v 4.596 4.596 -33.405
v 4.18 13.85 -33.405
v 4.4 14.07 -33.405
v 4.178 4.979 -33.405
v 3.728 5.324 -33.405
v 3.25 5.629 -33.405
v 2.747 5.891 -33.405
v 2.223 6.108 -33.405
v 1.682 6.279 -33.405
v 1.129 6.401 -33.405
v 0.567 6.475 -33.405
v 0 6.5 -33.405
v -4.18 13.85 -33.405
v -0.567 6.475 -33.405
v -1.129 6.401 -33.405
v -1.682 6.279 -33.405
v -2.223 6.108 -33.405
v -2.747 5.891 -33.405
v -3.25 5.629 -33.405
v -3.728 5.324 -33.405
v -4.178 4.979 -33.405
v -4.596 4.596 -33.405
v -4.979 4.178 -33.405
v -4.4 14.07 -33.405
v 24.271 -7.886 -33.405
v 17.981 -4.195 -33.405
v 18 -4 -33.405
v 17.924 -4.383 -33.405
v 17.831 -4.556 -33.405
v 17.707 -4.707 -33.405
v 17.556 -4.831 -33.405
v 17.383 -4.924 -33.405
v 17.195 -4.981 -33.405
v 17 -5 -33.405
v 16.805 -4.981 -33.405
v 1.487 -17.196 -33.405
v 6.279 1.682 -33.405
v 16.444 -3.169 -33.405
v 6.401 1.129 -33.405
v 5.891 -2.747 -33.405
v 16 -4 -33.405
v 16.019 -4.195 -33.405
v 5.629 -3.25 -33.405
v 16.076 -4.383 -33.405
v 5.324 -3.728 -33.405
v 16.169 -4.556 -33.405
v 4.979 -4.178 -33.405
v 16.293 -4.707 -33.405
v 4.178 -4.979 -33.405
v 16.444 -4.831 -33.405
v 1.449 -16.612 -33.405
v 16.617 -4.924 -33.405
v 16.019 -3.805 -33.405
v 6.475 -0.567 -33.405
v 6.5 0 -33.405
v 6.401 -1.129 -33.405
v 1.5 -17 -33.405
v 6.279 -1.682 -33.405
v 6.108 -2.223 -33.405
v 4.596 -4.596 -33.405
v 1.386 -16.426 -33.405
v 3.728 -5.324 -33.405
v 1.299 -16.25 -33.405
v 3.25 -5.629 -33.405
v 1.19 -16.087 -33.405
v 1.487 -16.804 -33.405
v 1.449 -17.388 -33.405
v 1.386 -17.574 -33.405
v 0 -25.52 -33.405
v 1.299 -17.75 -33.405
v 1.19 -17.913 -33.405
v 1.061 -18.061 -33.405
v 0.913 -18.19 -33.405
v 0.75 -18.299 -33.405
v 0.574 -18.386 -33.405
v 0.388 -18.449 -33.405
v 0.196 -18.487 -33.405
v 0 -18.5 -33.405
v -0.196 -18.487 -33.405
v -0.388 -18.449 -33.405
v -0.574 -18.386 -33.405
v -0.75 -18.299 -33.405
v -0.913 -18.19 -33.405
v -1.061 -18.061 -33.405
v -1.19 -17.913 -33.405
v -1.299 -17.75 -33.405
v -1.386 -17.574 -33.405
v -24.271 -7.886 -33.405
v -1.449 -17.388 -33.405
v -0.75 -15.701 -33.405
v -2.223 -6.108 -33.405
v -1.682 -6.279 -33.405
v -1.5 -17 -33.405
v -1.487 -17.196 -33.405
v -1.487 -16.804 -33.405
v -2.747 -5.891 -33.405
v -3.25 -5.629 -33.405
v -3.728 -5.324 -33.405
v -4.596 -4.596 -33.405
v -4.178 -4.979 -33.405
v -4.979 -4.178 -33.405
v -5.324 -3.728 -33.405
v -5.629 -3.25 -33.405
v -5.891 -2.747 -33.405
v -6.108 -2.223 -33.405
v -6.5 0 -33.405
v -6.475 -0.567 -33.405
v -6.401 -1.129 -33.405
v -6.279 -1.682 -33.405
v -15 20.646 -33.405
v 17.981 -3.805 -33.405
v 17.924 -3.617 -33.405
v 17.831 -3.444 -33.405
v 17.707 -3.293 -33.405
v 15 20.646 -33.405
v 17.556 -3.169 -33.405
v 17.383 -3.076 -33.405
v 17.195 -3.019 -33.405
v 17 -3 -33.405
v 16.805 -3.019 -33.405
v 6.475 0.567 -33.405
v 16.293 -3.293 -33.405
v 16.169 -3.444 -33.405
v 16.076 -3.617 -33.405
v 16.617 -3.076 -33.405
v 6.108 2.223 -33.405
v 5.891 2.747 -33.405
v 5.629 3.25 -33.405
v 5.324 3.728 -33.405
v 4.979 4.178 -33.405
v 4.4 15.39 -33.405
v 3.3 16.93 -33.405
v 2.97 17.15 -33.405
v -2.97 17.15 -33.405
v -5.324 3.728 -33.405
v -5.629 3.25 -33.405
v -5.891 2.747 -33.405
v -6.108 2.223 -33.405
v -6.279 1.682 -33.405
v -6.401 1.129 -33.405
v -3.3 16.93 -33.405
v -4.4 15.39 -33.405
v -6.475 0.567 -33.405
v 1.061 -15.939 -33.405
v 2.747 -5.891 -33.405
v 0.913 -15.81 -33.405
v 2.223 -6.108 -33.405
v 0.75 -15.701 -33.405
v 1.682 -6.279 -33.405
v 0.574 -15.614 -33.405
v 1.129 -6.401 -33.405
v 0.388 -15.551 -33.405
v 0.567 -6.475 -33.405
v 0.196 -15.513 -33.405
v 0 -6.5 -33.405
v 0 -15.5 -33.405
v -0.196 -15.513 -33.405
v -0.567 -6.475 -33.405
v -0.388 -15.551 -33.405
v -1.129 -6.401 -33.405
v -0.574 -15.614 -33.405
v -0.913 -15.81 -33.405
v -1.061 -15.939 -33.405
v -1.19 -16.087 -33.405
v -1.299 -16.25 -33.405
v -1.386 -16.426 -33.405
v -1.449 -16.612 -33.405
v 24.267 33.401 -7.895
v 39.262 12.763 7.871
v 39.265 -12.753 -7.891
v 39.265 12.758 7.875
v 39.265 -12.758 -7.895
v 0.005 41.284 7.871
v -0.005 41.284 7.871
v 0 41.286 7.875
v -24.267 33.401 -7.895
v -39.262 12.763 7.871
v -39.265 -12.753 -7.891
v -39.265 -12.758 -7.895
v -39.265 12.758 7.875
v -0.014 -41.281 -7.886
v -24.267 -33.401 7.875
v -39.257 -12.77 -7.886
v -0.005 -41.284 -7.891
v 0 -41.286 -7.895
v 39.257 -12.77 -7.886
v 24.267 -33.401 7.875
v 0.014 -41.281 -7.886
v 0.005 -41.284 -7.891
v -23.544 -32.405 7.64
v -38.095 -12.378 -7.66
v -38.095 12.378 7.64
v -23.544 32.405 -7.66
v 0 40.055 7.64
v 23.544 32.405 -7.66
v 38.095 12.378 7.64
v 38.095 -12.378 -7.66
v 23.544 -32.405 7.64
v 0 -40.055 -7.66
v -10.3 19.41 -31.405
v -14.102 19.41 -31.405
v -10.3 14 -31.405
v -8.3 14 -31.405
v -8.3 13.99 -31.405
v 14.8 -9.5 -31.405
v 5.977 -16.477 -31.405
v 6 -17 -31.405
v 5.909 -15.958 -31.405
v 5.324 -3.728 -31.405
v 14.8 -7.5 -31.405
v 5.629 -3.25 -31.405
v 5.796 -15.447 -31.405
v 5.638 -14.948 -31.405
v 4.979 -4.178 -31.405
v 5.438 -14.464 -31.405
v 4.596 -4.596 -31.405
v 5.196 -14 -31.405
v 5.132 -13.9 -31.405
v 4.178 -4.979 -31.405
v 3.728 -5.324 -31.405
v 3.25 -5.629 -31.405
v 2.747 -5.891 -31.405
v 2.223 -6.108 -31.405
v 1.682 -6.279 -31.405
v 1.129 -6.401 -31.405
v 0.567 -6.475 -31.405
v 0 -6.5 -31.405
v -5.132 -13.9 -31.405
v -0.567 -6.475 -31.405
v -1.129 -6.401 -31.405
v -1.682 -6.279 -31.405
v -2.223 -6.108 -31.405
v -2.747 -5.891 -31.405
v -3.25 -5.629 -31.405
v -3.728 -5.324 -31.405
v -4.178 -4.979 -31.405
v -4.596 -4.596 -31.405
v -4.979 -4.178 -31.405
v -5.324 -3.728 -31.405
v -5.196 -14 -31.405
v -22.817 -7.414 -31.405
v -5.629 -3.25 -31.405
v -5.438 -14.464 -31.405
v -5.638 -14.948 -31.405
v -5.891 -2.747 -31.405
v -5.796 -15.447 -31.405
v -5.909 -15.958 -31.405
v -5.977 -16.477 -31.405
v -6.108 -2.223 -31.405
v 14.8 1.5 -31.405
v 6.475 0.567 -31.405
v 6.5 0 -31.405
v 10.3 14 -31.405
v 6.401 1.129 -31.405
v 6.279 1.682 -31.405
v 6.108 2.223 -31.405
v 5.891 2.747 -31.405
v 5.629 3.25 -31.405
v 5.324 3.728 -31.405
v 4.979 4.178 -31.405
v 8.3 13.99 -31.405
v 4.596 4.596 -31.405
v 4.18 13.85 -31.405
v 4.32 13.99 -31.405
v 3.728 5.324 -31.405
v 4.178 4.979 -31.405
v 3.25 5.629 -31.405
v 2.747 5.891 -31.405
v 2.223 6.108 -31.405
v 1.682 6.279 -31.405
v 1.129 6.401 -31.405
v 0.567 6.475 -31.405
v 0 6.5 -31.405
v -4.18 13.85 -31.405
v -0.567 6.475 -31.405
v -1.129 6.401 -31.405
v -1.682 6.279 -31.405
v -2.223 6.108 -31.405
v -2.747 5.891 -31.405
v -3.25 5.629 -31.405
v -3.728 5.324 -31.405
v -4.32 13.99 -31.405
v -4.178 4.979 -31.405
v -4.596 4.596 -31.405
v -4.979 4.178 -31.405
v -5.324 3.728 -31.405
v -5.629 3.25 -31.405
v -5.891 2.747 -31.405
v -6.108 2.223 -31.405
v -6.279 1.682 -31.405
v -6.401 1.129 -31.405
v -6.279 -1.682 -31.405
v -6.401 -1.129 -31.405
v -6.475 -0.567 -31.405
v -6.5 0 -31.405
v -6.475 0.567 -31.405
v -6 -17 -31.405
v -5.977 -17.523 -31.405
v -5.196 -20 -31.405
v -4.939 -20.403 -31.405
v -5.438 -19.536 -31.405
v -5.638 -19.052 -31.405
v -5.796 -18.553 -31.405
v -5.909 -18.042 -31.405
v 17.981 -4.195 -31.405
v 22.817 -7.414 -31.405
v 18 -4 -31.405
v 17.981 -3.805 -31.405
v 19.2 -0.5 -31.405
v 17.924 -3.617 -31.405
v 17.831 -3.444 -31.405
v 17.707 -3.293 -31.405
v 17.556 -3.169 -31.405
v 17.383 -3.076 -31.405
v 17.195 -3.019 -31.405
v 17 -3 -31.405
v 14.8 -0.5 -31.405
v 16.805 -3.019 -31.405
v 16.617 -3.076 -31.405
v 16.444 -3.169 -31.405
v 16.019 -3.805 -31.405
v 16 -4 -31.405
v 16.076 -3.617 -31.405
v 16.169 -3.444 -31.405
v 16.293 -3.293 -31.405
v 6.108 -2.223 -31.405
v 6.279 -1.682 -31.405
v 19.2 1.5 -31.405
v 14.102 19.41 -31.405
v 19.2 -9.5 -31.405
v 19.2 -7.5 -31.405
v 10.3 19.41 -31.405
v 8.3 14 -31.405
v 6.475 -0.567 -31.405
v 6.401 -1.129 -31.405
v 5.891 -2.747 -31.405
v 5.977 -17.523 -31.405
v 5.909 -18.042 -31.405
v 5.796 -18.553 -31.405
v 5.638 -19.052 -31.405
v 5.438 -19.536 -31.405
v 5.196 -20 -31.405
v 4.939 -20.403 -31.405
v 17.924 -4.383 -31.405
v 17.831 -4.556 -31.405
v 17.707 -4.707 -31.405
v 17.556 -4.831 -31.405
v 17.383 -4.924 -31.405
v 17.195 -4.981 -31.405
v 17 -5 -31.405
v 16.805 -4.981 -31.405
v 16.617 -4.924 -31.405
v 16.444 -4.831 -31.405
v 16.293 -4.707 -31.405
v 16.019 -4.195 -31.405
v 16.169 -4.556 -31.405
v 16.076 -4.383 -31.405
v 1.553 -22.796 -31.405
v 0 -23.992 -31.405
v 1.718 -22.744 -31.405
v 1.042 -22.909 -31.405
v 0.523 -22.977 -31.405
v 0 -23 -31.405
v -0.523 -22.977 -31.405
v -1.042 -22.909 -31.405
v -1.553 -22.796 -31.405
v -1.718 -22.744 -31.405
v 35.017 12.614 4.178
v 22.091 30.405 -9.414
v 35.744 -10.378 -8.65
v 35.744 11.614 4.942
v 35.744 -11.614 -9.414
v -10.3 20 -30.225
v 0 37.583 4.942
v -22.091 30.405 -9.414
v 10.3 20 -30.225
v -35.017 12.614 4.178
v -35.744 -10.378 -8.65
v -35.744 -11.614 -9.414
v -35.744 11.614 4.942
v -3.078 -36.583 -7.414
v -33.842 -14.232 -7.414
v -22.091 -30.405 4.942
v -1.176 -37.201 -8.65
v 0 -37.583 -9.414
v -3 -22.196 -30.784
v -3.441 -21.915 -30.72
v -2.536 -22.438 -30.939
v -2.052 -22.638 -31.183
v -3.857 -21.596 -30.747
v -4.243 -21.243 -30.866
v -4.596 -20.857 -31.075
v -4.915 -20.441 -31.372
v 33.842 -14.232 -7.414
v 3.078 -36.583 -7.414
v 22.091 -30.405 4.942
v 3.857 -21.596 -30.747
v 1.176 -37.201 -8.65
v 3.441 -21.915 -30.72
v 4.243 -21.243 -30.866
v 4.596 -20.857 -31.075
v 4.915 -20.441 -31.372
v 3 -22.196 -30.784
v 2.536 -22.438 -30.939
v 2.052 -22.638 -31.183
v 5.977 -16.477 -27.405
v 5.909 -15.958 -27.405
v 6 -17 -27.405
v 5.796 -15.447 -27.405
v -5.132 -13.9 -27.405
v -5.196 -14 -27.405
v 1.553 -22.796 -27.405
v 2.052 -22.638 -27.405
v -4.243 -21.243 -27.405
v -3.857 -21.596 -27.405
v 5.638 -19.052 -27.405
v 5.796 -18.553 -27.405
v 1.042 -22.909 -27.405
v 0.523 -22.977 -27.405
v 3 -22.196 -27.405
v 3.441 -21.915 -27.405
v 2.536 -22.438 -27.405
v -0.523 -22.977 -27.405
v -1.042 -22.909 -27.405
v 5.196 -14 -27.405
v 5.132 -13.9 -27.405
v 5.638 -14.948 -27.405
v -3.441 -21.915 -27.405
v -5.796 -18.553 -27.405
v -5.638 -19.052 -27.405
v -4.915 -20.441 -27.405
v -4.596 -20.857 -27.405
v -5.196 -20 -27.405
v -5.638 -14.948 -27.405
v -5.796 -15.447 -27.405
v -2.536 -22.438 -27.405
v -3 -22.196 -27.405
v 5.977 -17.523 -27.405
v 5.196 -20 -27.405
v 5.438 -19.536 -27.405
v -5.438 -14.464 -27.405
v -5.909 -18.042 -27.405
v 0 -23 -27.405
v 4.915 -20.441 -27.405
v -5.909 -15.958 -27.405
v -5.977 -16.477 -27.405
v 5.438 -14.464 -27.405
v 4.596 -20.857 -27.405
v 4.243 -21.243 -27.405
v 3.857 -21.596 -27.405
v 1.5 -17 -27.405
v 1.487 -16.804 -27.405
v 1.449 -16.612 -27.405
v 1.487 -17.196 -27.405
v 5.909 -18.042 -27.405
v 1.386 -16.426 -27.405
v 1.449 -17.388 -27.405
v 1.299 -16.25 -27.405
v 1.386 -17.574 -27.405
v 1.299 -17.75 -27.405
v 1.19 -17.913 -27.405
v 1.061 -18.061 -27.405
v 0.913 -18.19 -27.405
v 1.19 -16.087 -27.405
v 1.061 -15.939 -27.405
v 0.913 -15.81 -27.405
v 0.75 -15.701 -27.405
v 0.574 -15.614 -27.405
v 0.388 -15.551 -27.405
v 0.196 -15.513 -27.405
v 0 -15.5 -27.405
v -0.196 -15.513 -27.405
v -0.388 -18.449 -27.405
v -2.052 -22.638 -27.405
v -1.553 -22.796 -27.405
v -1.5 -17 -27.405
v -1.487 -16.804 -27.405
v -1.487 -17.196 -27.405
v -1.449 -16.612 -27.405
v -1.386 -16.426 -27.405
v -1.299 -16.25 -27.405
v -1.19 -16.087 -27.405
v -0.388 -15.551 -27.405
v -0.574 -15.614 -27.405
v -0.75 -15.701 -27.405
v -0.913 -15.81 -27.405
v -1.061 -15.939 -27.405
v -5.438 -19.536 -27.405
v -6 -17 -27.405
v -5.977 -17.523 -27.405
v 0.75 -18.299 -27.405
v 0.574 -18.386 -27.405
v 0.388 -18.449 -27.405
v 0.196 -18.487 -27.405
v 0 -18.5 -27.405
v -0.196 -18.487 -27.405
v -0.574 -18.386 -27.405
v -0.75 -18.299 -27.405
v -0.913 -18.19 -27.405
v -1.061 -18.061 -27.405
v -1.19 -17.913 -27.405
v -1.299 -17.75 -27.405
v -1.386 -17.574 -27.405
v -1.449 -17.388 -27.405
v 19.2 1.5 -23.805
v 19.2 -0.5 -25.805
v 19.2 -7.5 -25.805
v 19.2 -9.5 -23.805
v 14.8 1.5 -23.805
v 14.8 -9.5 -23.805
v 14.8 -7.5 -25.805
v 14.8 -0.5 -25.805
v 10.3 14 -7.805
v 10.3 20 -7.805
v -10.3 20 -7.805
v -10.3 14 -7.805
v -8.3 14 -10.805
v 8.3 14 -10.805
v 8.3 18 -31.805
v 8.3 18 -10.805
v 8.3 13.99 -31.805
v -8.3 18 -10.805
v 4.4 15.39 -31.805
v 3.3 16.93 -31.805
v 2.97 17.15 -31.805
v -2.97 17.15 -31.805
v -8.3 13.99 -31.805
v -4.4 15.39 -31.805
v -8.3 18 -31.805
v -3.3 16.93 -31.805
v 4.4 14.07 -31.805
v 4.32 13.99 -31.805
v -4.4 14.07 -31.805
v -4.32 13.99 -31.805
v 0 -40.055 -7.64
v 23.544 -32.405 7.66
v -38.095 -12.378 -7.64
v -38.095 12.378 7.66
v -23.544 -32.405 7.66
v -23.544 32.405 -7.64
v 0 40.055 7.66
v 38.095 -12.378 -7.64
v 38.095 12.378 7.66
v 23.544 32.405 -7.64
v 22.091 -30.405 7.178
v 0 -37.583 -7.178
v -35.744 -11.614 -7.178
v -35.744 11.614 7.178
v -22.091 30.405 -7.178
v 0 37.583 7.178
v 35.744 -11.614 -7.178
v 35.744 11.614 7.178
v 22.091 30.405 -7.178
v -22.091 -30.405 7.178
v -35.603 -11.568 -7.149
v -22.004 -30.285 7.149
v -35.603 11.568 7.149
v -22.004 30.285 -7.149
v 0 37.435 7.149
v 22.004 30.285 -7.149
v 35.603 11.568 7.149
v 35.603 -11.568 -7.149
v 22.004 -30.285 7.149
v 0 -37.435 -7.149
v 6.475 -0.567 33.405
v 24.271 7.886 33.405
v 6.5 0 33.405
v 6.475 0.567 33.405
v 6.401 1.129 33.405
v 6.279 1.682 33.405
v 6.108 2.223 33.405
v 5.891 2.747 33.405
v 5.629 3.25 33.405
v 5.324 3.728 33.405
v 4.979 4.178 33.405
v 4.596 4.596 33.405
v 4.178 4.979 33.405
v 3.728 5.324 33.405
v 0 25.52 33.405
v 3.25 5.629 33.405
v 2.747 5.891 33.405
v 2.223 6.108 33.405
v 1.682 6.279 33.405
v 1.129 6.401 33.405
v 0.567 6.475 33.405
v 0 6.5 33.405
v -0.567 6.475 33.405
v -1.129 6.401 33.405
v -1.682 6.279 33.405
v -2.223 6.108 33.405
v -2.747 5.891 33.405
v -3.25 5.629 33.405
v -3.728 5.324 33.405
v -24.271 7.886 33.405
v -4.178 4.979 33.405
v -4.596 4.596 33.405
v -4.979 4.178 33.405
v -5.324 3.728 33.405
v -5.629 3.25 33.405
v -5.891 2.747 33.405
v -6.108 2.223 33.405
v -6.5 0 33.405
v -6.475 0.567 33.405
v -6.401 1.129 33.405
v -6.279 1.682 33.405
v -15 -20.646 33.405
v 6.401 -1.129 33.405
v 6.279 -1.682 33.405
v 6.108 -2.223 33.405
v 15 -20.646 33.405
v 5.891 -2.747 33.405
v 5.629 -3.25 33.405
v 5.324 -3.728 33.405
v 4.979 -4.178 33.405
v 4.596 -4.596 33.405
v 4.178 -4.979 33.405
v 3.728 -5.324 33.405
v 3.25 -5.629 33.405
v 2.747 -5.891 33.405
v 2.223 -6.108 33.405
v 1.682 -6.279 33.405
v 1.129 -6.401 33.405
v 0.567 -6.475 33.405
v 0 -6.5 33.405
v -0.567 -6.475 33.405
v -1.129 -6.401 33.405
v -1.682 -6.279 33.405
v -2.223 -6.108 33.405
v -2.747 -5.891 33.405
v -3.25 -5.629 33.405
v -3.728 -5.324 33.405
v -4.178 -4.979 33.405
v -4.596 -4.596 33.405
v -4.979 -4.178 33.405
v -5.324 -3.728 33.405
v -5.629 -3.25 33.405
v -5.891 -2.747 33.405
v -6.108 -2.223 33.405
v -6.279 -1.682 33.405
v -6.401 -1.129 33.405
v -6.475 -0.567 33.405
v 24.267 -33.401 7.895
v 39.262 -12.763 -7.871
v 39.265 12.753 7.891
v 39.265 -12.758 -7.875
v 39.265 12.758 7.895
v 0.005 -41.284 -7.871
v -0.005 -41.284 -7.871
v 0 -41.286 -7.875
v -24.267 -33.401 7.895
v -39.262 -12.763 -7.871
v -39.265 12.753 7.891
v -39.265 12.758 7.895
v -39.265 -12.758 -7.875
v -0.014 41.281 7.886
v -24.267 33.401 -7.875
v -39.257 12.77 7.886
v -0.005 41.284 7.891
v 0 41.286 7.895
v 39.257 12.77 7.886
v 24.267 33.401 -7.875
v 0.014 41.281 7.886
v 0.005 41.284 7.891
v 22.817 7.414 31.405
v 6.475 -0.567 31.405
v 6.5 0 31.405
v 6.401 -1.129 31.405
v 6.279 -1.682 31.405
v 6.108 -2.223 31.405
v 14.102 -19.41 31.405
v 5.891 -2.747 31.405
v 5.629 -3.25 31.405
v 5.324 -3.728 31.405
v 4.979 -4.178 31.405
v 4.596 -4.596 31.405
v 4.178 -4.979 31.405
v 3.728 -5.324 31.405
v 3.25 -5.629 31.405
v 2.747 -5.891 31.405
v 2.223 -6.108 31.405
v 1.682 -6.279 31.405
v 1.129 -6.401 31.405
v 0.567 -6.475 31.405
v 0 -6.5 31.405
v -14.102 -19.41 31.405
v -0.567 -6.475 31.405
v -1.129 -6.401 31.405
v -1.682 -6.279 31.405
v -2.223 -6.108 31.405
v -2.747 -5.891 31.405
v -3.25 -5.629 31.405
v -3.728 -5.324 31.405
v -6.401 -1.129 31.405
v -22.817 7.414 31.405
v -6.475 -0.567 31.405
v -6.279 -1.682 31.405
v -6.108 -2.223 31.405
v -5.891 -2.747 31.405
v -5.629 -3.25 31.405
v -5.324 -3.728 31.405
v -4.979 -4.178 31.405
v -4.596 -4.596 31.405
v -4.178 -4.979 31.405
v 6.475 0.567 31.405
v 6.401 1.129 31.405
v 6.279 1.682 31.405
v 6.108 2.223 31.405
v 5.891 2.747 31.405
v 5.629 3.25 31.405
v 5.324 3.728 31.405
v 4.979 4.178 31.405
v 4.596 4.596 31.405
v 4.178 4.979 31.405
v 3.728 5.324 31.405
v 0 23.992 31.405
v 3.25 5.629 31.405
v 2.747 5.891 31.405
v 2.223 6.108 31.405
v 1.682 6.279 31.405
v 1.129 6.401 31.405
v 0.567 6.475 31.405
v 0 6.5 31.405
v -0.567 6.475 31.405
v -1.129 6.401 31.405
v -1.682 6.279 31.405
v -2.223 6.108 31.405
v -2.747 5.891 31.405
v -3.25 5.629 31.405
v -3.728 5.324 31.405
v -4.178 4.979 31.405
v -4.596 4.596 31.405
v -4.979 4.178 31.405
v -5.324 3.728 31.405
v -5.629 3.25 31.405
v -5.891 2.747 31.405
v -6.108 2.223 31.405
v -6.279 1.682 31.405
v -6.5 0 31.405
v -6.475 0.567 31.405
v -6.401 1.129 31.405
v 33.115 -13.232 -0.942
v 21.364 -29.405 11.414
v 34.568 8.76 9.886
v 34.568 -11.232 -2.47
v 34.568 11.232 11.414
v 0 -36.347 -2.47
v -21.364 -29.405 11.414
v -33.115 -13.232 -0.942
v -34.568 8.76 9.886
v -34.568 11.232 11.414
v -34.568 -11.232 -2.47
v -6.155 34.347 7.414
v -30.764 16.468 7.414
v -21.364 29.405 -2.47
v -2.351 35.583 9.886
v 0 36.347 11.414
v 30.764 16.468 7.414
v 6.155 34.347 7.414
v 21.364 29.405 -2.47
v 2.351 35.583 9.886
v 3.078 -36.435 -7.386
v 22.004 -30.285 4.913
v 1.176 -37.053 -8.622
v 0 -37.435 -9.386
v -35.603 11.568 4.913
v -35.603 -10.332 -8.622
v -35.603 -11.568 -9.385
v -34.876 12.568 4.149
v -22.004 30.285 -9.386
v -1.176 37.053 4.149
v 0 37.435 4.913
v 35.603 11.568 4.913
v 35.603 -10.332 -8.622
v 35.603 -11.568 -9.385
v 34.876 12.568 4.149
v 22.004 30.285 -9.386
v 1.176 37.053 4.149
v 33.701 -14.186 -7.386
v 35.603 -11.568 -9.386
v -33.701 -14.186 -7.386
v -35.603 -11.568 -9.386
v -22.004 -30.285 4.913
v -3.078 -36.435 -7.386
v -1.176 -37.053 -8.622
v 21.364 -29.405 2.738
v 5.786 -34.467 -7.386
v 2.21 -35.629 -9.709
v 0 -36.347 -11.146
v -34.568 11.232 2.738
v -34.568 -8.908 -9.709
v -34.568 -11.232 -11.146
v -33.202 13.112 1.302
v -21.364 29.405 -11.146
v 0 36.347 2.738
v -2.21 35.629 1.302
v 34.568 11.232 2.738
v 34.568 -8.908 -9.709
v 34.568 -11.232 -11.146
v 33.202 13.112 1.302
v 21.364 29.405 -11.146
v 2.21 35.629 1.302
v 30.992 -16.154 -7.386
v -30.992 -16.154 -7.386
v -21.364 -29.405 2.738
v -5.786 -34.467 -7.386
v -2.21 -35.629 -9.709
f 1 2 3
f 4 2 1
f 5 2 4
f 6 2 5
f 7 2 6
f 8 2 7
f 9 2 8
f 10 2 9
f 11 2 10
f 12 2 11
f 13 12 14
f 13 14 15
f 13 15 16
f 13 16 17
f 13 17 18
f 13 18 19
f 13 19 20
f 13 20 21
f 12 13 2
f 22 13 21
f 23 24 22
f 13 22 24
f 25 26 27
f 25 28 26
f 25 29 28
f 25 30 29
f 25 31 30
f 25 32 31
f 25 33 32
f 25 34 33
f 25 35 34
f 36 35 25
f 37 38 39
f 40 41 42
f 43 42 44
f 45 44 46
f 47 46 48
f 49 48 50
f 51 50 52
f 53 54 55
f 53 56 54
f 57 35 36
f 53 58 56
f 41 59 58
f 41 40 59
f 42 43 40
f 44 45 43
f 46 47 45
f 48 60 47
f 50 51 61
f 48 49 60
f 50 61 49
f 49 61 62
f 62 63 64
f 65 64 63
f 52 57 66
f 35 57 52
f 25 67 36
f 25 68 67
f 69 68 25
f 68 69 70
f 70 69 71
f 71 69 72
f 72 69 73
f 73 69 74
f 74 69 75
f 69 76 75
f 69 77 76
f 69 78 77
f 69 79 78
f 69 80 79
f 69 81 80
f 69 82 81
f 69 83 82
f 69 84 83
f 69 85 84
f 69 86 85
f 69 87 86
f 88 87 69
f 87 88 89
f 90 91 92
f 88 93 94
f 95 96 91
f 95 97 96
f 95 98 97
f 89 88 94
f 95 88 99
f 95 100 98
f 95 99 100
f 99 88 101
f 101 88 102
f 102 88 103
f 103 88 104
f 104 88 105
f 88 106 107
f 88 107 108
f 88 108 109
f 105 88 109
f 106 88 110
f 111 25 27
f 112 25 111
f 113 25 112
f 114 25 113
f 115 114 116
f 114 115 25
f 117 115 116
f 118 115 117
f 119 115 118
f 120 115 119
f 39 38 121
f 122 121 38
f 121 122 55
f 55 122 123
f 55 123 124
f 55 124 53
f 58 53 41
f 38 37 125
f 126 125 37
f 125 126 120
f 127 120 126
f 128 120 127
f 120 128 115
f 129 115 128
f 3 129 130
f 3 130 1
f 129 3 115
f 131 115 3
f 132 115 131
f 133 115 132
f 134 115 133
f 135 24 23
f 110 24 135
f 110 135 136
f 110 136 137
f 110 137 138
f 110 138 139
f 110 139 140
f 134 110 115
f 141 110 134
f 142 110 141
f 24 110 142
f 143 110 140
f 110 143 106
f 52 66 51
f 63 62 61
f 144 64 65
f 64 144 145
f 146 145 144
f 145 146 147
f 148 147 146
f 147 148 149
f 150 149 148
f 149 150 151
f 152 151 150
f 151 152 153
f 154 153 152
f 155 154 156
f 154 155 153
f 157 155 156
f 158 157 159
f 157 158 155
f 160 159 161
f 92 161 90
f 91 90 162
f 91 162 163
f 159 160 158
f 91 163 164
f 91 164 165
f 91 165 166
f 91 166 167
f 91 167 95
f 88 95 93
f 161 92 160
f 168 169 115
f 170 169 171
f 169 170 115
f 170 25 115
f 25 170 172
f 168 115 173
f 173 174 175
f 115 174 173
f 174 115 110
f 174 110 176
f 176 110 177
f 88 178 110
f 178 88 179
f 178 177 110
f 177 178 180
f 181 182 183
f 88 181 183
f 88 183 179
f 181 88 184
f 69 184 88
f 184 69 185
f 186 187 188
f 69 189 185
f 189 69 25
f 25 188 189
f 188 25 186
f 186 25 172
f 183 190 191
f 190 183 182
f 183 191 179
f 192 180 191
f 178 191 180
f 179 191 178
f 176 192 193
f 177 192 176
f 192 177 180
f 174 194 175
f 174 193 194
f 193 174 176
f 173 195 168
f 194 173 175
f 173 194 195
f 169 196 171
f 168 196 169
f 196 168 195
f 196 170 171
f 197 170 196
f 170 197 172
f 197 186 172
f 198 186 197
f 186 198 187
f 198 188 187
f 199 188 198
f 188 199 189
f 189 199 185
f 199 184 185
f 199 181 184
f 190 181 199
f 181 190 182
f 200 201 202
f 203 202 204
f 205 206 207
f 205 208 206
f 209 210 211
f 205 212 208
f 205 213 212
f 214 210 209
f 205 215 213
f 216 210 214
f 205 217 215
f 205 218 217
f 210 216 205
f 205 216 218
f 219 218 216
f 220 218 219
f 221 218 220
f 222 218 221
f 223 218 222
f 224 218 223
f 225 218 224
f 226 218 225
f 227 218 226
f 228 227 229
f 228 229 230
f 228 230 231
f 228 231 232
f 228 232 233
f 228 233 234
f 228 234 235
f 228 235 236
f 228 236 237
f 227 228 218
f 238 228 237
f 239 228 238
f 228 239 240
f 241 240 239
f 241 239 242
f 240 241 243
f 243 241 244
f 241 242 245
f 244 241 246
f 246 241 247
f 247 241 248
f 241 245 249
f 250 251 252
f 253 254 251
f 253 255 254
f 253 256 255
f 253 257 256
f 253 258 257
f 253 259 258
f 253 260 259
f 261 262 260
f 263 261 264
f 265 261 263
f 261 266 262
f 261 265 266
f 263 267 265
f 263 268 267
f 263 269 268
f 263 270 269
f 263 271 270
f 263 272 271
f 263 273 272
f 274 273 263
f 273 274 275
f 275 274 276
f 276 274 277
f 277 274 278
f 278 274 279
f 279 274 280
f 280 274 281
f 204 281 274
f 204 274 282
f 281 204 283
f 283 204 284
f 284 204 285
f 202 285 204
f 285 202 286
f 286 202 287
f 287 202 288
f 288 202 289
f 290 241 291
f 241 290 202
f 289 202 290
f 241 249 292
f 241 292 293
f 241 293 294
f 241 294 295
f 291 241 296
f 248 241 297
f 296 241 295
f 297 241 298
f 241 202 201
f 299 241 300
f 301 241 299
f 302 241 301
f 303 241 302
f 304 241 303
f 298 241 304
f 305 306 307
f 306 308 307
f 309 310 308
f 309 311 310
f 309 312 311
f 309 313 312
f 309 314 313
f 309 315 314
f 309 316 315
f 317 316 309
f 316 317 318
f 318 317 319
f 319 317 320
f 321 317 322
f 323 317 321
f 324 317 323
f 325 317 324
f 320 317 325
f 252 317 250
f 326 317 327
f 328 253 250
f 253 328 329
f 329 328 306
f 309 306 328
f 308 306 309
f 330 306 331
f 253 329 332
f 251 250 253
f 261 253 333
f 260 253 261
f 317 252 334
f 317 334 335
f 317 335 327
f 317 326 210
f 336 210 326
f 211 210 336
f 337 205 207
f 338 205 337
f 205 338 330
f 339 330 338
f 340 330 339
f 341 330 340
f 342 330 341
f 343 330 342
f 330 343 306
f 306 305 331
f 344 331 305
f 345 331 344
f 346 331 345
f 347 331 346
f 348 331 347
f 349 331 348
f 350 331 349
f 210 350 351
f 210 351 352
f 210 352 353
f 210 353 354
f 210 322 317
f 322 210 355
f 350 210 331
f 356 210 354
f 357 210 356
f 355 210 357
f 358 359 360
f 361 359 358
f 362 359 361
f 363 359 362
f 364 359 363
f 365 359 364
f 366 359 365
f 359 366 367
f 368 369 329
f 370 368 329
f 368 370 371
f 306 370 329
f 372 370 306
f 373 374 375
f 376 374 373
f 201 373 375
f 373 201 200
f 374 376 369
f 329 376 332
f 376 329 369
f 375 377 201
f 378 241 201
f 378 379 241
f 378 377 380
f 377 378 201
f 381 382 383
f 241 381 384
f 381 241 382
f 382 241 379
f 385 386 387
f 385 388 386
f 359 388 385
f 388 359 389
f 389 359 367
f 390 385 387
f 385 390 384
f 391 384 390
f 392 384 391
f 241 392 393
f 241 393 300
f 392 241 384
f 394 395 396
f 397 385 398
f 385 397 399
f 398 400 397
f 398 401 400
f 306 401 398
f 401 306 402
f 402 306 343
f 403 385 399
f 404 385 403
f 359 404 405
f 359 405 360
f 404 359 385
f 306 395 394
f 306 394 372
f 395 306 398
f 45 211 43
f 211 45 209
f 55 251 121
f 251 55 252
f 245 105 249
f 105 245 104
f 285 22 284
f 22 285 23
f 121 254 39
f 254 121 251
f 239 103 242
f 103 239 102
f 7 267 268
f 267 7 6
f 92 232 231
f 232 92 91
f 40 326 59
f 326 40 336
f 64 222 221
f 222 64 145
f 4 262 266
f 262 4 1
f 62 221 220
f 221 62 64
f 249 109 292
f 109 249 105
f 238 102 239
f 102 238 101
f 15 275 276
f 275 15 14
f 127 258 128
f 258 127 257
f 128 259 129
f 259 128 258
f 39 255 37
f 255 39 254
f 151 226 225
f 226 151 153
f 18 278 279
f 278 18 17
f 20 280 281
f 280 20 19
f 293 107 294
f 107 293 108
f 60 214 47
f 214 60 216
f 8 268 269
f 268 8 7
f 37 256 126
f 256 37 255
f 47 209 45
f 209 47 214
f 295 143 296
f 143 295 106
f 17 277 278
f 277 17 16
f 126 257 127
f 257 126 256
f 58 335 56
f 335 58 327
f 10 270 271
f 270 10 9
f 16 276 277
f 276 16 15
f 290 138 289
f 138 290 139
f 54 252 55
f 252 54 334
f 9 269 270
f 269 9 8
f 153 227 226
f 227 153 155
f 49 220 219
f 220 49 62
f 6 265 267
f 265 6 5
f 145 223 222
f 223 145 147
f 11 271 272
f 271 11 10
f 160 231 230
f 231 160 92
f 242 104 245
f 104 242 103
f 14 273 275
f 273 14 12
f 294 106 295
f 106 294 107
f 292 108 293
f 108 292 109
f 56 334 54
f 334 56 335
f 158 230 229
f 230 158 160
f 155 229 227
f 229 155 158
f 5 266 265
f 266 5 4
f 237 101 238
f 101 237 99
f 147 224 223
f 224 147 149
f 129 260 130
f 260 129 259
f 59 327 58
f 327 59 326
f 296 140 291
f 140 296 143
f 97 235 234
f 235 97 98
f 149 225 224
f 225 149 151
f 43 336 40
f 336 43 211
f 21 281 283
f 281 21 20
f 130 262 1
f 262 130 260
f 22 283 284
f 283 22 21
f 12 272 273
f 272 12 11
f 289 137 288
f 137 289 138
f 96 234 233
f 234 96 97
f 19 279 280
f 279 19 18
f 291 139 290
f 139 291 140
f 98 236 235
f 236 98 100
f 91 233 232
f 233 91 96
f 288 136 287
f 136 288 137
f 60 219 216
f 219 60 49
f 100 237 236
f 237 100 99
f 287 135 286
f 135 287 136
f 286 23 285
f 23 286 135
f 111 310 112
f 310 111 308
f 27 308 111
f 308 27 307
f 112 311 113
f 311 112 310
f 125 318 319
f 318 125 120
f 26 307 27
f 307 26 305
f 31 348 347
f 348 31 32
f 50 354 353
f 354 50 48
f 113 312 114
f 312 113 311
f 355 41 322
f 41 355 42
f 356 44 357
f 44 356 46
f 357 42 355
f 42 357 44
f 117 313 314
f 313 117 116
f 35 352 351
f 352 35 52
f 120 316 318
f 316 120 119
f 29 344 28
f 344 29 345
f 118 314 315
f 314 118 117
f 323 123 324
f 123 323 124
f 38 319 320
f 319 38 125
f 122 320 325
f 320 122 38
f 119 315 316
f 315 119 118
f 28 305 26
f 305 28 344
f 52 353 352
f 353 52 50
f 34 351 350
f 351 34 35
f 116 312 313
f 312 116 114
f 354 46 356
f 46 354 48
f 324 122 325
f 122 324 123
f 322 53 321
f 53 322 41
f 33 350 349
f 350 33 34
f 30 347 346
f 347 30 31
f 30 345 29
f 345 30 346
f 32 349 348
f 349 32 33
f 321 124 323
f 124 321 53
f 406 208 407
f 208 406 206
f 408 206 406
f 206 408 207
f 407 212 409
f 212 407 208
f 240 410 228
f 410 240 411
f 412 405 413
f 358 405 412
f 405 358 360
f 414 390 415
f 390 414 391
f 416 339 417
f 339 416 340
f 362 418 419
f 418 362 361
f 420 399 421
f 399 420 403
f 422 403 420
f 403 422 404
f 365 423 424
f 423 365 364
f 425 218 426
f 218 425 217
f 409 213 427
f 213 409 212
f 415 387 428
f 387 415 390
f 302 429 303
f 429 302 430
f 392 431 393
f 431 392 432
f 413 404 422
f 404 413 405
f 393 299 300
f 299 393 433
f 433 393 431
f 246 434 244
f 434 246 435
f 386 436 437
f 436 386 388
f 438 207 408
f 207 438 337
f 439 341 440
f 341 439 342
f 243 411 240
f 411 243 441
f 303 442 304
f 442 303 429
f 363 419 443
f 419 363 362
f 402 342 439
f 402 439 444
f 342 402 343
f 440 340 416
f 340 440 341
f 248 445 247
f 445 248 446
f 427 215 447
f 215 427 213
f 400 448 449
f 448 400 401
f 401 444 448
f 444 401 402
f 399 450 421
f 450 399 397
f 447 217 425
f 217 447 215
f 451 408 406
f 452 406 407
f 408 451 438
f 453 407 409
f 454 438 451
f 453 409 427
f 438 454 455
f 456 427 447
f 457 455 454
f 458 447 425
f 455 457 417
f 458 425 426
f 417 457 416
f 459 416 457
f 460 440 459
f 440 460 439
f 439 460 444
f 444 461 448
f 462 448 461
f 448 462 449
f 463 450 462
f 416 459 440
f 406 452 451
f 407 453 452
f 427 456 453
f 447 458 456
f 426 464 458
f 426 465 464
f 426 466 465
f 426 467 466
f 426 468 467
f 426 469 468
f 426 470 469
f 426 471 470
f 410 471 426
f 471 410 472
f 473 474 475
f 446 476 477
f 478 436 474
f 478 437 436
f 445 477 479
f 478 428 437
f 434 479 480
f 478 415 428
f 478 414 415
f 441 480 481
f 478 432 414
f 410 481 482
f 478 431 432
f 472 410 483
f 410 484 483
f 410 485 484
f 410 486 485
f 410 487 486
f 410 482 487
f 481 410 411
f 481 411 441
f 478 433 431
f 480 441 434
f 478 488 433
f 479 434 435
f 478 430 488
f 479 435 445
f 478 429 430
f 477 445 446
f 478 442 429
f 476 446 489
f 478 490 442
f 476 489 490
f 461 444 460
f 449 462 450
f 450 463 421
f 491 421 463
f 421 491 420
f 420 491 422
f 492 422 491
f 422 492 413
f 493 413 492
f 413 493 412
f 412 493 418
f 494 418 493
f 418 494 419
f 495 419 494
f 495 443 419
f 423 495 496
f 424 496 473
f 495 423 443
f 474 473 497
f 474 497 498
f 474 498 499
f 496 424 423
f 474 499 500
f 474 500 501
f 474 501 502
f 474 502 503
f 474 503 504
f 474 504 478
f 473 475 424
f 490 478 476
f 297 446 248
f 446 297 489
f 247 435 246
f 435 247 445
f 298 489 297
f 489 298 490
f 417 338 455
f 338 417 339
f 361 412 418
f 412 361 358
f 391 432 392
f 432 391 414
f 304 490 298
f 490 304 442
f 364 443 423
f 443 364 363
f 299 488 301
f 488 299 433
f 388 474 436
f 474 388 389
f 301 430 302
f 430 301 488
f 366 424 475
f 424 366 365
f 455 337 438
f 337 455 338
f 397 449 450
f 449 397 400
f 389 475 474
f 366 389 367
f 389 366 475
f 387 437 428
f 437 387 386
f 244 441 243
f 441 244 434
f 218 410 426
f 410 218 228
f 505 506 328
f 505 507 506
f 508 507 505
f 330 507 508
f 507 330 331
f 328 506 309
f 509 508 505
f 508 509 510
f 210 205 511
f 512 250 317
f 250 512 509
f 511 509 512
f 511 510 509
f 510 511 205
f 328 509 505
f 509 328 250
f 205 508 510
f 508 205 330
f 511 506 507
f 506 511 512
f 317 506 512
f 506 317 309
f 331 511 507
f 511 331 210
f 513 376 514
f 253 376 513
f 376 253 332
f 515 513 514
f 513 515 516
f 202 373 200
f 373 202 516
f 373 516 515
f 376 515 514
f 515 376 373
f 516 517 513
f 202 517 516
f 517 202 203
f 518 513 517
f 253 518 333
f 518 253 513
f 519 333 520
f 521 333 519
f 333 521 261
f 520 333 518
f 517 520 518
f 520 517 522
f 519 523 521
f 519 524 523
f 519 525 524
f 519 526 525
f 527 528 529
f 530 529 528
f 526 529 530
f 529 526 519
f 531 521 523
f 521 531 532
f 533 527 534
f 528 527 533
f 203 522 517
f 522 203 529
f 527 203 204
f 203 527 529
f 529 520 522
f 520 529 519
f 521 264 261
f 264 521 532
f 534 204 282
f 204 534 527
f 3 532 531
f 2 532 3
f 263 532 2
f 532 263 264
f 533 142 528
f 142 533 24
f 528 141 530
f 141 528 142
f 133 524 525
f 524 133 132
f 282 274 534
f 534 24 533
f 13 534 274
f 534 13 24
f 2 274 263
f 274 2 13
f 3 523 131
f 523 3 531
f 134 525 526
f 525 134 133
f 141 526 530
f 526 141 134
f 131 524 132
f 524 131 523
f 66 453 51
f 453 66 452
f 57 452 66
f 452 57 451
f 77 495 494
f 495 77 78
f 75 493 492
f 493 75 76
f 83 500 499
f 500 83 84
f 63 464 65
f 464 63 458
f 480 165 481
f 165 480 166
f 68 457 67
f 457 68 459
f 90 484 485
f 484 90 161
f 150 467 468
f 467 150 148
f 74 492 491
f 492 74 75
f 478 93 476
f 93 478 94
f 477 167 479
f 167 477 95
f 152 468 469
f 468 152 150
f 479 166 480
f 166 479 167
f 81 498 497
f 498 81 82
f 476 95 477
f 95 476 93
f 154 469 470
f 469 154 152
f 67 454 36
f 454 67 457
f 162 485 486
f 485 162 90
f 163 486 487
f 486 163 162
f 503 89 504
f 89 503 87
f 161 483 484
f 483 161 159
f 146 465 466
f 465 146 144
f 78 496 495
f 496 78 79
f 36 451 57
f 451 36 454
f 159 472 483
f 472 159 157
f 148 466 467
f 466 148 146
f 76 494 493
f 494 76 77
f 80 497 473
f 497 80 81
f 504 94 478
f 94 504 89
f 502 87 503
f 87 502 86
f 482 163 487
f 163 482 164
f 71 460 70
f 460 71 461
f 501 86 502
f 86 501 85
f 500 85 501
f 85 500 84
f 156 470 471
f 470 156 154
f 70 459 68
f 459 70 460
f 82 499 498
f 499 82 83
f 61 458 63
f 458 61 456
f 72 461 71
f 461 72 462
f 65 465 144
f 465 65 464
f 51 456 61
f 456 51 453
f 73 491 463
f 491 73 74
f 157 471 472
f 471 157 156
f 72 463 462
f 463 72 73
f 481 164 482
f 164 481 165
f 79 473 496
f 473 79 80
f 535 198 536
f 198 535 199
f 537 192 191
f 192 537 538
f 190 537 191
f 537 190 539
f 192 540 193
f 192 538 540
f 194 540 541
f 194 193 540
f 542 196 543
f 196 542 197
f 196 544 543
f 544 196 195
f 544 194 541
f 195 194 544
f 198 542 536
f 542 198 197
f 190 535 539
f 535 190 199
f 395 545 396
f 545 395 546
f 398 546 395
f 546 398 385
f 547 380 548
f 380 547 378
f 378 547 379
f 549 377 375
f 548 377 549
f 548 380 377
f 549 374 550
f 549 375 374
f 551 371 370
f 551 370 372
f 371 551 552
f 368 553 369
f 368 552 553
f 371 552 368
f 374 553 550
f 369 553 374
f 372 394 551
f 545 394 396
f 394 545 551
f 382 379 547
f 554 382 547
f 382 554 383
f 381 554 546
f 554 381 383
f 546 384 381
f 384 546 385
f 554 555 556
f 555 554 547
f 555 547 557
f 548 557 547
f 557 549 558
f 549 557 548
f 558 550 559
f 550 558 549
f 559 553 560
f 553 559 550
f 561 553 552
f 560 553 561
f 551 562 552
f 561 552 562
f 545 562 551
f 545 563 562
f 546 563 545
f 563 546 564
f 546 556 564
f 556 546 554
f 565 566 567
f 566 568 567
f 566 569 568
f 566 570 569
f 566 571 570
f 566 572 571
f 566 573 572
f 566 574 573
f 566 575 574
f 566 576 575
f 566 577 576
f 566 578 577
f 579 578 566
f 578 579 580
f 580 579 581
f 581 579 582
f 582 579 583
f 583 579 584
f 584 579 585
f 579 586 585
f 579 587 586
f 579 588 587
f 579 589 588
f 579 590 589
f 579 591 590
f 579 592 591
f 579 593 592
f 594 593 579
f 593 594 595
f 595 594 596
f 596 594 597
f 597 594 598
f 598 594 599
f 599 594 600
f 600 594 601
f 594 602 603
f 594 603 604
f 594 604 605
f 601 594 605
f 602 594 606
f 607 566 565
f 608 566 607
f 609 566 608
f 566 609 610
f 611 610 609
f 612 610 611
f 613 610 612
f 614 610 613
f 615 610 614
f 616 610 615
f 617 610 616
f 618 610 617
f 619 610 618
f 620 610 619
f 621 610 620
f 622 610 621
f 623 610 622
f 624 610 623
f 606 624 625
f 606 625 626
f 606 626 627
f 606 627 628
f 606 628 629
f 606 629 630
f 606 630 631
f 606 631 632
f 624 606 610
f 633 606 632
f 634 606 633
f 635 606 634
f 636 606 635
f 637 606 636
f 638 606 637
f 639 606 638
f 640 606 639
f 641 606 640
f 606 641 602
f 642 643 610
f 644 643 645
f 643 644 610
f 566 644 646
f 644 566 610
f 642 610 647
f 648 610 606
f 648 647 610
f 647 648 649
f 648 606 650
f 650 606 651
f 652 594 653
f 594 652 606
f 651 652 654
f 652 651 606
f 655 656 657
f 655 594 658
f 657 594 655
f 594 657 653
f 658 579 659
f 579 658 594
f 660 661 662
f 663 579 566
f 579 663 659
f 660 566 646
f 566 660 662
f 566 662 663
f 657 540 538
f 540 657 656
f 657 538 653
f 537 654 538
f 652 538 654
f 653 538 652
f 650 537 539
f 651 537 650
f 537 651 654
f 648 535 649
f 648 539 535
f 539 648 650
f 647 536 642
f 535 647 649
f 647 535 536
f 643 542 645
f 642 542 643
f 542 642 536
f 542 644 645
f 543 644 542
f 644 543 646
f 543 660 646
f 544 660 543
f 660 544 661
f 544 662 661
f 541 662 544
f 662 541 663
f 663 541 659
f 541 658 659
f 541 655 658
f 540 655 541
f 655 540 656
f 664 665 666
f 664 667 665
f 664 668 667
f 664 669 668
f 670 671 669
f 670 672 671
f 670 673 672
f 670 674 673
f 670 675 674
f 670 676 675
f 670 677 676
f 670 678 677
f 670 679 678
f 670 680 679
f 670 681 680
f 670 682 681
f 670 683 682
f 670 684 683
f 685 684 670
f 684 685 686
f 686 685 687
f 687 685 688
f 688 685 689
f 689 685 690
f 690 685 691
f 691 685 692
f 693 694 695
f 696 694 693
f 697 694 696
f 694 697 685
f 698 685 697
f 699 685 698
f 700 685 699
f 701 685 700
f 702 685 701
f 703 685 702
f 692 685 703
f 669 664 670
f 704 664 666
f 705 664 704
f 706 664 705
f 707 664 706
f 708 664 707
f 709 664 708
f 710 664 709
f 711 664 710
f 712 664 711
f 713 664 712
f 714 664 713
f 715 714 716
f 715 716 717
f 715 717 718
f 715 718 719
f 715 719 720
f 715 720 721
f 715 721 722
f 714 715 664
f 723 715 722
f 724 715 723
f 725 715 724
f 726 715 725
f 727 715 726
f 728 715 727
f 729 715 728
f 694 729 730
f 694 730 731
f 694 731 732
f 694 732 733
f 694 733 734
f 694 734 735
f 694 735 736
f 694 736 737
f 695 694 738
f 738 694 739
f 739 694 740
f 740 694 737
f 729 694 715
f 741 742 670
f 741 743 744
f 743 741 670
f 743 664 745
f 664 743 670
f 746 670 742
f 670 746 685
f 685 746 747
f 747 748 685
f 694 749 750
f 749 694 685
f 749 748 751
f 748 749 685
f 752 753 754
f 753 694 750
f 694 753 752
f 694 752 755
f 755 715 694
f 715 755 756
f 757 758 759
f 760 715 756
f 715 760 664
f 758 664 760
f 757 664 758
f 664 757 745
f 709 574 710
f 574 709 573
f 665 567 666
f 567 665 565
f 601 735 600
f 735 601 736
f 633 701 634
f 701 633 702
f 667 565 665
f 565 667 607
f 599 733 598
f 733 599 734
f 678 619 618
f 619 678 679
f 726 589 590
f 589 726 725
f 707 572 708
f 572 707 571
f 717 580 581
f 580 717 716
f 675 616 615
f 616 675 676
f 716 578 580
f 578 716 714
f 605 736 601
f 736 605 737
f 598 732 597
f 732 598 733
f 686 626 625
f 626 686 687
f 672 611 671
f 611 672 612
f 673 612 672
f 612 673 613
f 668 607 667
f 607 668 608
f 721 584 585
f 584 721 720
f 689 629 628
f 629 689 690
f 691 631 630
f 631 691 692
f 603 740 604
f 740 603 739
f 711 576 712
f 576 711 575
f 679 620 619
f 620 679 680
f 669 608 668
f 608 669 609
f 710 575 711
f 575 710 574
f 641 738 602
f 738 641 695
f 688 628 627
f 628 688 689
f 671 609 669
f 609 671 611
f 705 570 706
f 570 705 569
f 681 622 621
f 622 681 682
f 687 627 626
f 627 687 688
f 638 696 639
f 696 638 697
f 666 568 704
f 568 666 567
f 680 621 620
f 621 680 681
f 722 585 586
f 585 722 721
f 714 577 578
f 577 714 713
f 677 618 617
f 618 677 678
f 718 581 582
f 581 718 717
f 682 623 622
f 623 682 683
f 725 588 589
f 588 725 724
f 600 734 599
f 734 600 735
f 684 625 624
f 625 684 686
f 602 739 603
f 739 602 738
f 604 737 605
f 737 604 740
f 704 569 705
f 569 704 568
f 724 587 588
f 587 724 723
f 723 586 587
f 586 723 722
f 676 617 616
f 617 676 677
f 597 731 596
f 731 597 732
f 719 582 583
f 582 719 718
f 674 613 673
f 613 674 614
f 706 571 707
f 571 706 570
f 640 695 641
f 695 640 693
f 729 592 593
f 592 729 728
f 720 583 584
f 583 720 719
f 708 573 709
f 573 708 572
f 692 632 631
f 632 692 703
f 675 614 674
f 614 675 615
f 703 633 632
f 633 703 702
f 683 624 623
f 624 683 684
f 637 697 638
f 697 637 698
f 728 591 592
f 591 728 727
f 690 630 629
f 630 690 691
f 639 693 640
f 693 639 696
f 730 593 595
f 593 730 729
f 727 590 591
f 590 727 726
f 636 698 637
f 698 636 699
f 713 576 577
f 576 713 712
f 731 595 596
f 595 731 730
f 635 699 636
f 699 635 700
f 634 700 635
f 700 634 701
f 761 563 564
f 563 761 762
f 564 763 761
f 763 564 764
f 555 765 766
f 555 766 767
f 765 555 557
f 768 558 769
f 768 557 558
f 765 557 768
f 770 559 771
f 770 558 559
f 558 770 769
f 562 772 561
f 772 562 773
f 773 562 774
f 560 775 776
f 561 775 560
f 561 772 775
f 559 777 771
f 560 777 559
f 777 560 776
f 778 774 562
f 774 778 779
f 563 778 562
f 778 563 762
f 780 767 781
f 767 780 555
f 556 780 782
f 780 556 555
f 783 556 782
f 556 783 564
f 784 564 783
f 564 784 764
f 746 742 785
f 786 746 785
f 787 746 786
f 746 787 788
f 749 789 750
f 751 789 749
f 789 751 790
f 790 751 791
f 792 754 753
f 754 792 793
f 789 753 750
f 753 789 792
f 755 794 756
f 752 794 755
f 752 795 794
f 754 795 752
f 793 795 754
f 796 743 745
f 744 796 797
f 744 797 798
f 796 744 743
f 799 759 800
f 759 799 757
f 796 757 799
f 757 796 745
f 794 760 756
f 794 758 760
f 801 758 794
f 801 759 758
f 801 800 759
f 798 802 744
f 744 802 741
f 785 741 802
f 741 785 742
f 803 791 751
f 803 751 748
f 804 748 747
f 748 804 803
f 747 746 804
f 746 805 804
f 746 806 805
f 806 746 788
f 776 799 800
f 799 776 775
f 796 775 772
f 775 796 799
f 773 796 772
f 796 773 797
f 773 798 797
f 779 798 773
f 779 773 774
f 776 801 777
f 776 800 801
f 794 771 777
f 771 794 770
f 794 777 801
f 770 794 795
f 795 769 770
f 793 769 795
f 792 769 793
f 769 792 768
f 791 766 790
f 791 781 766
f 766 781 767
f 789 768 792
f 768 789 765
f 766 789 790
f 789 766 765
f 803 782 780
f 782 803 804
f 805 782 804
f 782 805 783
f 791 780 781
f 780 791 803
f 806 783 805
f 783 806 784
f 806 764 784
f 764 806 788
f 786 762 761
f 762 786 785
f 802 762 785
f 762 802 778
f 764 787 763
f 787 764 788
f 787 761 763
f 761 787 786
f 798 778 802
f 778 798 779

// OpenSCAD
/* [Toggles] */
render_bottom = true;
render_top = true;
debug_render_screen = false;

/* [Dimensions] */
side = 30;
thickness = 2;

/* [Buzzer] */
buz = 12;
buz_hole = 3;
buz_offset = -17;

/* [Screen] */
scr_window = 13;
scr_center = 9;
scr_close = 9;
scr_far = 9;
scr_width = 25;
scr_thickness = 4;

/* [USB] */
usb_offset = 18;
usb_thickness = 4;
usb_backwall = 3;
usb_wall = 2;
usb_width = 16.6;
usb_height = 20.6;
usb_gap = 1.6;
usb_port_offset = 1;
usb_port_scale = 1.1;

/* [Button] */
but_offset = [17, -4];
but_length = 7;
but_width = 4.4;
but_height = 5.6;
but_hole = 2;
but_backwall = 2;
but_wall = 2;

/* [Fitting] */
fit_margin = 1;
fit_outer = 3;
fit_inner = 4;
fit_tol = 0.12;

/* [Tolerances] */
$fs = 0.2;
$fa = 5;
stol = 0.4;
dtol = 0.01;

inradius = side * 0.5 * sqrt(5/2 + 11/10*sqrt(5));

function dodeca_points() = let(phi = (1 + sqrt(5)) / 2, ihp = 2 / (1 + sqrt(5))) [
    [-1, -1, -1], // 0
    [-1, -1,  1],
    [-1,  1, -1],
    [-1,  1,  1],
    [ 1, -1, -1], // 4
    [ 1, -1,  1],
    [ 1,  1, -1],
    [ 1,  1,  1],
    [0, -phi, -ihp], // 8
    [0, -phi,  ihp],
    [0,  phi, -ihp],
    [0,  phi,  ihp],
    [-ihp, 0, -phi], // 12
    [-ihp, 0,  phi],
    [ ihp, 0, -phi],
    [ ihp, 0,  phi],
    [-phi, -ihp, 0], // 16
    [-phi,  ihp, 0],
    [ phi, -ihp, 0],
    [ phi,  ihp, 0],
];

/*module dodecahedron_edge(side, step0, step1, step2, bump) {
    dihedral = acos(-1 / sqrt(5));
    ihp = 2 / (1 + sqrt(5));
    scale(side / (2 * ihp))
    rotate([(180 - dihedral) / 2, 0, 0])
    polyhedron(
        points = concat(
            (inradius - step0) / inradius * dodeca_points(),
            (inradius - step1) / inradius * dodeca_points(),
            (inradius - step2) / inradius * dodeca_points(),
            (inradius - step0) / inradius * dodeca_points() + [0, 0, -100],
            (inradius - step2) / inradius * dodeca_points() + [0, 0, -100],
            (inradius - step1) / inradius * dodeca_points() + [0, 0, bump],
            (inradius - step2) / inradius * dodeca_points() + [0, 0, bump],
        ),
        faces = [

        ]
    );
}*/

module dodeca_half(side) {
    dihedral = acos(-1 / sqrt(5));
    ihp = 2 / (1 + sqrt(5));
    scale(side / (2 * ihp))
    rotate([(180 - dihedral) / 2, 0, 0])
    polyhedron(
        points = concat(dodeca_points(), [[0, 0, 0]]),
        faces = [
            [8, 4, 14, 12, 0],
            [18, 19, 6, 14, 4],
            [10, 2, 12, 14, 6],
            [17, 16, 0, 12, 2],
            [16, 1, 9, 8, 0],
            [8, 9, 5, 18, 4],

            // loop: 1, 16, 17, 2, 10, 6, 19, 18, 5, 9 (clockwise)
            [1, 16, 20],
            [16, 17, 20],
            [17, 2, 20],
            [2, 10, 20],
            [10, 6, 20],
            [6, 19, 20],
            [19, 18, 20],
            [18, 5, 20],
            [5, 9, 20],
            [9, 1, 20],
        ],
        convexity = 3
    );
}

module dodeca_mask(lower_margin, upper_margin) {
    scale((inradius - lower_margin) / inradius)
    dodeca_half(side);
    translate([0, 0, -dtol])
    mirror([0, 0, 1])
    mirror([0, 1, 0])
    scale((inradius - upper_margin) / inradius)
    dodeca_half(side);
}

module shell() {
    difference() {
        //Solid half
        intersection() {
            dodeca_half(side);
            translate([0, 0, -dtol])
            dodeca_half(side);
        }
        //Interior
        scale((inradius - thickness) / inradius)
        dodeca_half(side);
        //Screen hole
        cylinder(d = scr_window, h = 1000, center = true);
    }
    //Screen rect
    if (debug_render_screen) {
        translate([0, 0, -inradius + thickness])
        translate([-scr_width / 2, -scr_close - scr_center / 2, 0])
        cube([scr_width, scr_close + scr_center + scr_far, scr_thickness]);
    }
}

module shell_bottom() {
    difference() {
        union() {
            difference() {
                //Base shell
                shell();
                //Button hole
                translate(but_offset)
                cylinder(d = but_hole, h = 1000, center=true);
            }
            translate([0, 0, -inradius + thickness]) {
                //Buzzer
                difference() {
                    translate([0, buz_offset, -dtol])
                    cylinder(d = buz, h = scr_thickness + dtol, center = false);
                    translate([-buz, -scr_close - scr_center / 2 - stol, -dtol])
                    cube([2 * buz, buz, scr_thickness + 2*dtol]);
                }
                //Usb box (solid)
                translate([0, usb_offset, 0]) {
                    translate([-usb_width / 2 - usb_wall, -usb_thickness, -dtol])
                    cube([usb_width + usb_wall * 2, usb_thickness + usb_wall, usb_height + usb_backwall + dtol]);
                }
                //Button arch
                translate(but_offset) {
                    difference() {
                        translate([-but_width / 2, -but_length / 2 - but_wall, -dtol])
                        cube([but_width, but_length + 2*but_wall, dtol + but_height + but_backwall]);
                        translate([-but_width / 2 - dtol, -but_length / 2, -2*dtol])
                        cube([but_width + 2*dtol, but_length, but_height + 2*dtol]);
                    }
                }
            }
        }
        //Buzzer hole
        translate([0, buz_offset, 0])
        cylinder(d = buz_hole, h = 1000, center = true);
        //Usb (carving)
        translate([0, usb_offset, -inradius + thickness]) {
            translate([-usb_width / 2, -usb_thickness - dtol, -thickness + usb_gap])
            cube([usb_width, usb_thickness + dtol, usb_height + (thickness - usb_gap)]);
            translate([0, -usb_port_offset, -thickness - dtol])
            linear_extrude(height = thickness + 2*dtol) {
                translate([0, -1.5])
                scale(usb_port_scale)
                translate([0, 1.5])
                polygon([
                    [-2.7, 0.0],
                    [-3.0, -0.2],
                    [-4.0, -1.6],
                    [-4.0, -2.8],
                    [-3.8, -3.0],
                    [3.8, -3.0],
                    [4.0, -2.8],
                    [4.0, -1.6],
                    [3.0, -0.2],
                    [2.7, 0.0],
                ]);
            }
        }
    }
}

if (render_bottom) {
    //Solid
    shell_bottom();
    //Connection
    intersection() {
        difference() {
            linear_extrude(height = side, center = true) {
                scale((inradius - fit_margin) / inradius)
                projection(cut = false) {
                    dodeca_half(side);
                }
            }
            linear_extrude(height = 1000, center = true) {
                scale((inradius - fit_outer) / inradius)
                projection(cut = false) {
                    dodeca_half(side);
                }
            }
        }
        dodeca_mask(dtol, dtol);
        scale(10)
        dodeca_half(side);
    }
}

if (render_top) {
    //Solid
    mirror([0, 0, 1])
    mirror([0, 1, 0])
    shell();
    //Connection
    intersection() {
        difference() {
            linear_extrude(height = side, center = true) {
                scale((inradius - fit_margin) / inradius)
                projection(cut = false) {
                    dodeca_half(side);
                }
            }
            linear_extrude(height = 1000, center = true) {
                scale((inradius - fit_outer - fit_tol - dtol) / inradius)
                projection(cut = false) {
                    dodeca_half(side);
                }
            }
        }
        dodeca_mask(dtol, dtol);
        mirror([0, 0, 1])
        mirror([0, 1, 0])
        scale(10)
        dodeca_half(side);
    }
    intersection() {
        difference() {
            linear_extrude(height = side, center = true) {
                scale((inradius - fit_outer - fit_tol) / inradius)
                projection(cut = false) {
                    dodeca_half(side);
                }
            }
            linear_extrude(height = 1000, center = true) {
                scale((inradius - fit_inner) / inradius)
                projection(cut = false) {
                    dodeca_half(side);
                }
            }
        }
        dodeca_mask(thickness + fit_tol, dtol);
    }
}
